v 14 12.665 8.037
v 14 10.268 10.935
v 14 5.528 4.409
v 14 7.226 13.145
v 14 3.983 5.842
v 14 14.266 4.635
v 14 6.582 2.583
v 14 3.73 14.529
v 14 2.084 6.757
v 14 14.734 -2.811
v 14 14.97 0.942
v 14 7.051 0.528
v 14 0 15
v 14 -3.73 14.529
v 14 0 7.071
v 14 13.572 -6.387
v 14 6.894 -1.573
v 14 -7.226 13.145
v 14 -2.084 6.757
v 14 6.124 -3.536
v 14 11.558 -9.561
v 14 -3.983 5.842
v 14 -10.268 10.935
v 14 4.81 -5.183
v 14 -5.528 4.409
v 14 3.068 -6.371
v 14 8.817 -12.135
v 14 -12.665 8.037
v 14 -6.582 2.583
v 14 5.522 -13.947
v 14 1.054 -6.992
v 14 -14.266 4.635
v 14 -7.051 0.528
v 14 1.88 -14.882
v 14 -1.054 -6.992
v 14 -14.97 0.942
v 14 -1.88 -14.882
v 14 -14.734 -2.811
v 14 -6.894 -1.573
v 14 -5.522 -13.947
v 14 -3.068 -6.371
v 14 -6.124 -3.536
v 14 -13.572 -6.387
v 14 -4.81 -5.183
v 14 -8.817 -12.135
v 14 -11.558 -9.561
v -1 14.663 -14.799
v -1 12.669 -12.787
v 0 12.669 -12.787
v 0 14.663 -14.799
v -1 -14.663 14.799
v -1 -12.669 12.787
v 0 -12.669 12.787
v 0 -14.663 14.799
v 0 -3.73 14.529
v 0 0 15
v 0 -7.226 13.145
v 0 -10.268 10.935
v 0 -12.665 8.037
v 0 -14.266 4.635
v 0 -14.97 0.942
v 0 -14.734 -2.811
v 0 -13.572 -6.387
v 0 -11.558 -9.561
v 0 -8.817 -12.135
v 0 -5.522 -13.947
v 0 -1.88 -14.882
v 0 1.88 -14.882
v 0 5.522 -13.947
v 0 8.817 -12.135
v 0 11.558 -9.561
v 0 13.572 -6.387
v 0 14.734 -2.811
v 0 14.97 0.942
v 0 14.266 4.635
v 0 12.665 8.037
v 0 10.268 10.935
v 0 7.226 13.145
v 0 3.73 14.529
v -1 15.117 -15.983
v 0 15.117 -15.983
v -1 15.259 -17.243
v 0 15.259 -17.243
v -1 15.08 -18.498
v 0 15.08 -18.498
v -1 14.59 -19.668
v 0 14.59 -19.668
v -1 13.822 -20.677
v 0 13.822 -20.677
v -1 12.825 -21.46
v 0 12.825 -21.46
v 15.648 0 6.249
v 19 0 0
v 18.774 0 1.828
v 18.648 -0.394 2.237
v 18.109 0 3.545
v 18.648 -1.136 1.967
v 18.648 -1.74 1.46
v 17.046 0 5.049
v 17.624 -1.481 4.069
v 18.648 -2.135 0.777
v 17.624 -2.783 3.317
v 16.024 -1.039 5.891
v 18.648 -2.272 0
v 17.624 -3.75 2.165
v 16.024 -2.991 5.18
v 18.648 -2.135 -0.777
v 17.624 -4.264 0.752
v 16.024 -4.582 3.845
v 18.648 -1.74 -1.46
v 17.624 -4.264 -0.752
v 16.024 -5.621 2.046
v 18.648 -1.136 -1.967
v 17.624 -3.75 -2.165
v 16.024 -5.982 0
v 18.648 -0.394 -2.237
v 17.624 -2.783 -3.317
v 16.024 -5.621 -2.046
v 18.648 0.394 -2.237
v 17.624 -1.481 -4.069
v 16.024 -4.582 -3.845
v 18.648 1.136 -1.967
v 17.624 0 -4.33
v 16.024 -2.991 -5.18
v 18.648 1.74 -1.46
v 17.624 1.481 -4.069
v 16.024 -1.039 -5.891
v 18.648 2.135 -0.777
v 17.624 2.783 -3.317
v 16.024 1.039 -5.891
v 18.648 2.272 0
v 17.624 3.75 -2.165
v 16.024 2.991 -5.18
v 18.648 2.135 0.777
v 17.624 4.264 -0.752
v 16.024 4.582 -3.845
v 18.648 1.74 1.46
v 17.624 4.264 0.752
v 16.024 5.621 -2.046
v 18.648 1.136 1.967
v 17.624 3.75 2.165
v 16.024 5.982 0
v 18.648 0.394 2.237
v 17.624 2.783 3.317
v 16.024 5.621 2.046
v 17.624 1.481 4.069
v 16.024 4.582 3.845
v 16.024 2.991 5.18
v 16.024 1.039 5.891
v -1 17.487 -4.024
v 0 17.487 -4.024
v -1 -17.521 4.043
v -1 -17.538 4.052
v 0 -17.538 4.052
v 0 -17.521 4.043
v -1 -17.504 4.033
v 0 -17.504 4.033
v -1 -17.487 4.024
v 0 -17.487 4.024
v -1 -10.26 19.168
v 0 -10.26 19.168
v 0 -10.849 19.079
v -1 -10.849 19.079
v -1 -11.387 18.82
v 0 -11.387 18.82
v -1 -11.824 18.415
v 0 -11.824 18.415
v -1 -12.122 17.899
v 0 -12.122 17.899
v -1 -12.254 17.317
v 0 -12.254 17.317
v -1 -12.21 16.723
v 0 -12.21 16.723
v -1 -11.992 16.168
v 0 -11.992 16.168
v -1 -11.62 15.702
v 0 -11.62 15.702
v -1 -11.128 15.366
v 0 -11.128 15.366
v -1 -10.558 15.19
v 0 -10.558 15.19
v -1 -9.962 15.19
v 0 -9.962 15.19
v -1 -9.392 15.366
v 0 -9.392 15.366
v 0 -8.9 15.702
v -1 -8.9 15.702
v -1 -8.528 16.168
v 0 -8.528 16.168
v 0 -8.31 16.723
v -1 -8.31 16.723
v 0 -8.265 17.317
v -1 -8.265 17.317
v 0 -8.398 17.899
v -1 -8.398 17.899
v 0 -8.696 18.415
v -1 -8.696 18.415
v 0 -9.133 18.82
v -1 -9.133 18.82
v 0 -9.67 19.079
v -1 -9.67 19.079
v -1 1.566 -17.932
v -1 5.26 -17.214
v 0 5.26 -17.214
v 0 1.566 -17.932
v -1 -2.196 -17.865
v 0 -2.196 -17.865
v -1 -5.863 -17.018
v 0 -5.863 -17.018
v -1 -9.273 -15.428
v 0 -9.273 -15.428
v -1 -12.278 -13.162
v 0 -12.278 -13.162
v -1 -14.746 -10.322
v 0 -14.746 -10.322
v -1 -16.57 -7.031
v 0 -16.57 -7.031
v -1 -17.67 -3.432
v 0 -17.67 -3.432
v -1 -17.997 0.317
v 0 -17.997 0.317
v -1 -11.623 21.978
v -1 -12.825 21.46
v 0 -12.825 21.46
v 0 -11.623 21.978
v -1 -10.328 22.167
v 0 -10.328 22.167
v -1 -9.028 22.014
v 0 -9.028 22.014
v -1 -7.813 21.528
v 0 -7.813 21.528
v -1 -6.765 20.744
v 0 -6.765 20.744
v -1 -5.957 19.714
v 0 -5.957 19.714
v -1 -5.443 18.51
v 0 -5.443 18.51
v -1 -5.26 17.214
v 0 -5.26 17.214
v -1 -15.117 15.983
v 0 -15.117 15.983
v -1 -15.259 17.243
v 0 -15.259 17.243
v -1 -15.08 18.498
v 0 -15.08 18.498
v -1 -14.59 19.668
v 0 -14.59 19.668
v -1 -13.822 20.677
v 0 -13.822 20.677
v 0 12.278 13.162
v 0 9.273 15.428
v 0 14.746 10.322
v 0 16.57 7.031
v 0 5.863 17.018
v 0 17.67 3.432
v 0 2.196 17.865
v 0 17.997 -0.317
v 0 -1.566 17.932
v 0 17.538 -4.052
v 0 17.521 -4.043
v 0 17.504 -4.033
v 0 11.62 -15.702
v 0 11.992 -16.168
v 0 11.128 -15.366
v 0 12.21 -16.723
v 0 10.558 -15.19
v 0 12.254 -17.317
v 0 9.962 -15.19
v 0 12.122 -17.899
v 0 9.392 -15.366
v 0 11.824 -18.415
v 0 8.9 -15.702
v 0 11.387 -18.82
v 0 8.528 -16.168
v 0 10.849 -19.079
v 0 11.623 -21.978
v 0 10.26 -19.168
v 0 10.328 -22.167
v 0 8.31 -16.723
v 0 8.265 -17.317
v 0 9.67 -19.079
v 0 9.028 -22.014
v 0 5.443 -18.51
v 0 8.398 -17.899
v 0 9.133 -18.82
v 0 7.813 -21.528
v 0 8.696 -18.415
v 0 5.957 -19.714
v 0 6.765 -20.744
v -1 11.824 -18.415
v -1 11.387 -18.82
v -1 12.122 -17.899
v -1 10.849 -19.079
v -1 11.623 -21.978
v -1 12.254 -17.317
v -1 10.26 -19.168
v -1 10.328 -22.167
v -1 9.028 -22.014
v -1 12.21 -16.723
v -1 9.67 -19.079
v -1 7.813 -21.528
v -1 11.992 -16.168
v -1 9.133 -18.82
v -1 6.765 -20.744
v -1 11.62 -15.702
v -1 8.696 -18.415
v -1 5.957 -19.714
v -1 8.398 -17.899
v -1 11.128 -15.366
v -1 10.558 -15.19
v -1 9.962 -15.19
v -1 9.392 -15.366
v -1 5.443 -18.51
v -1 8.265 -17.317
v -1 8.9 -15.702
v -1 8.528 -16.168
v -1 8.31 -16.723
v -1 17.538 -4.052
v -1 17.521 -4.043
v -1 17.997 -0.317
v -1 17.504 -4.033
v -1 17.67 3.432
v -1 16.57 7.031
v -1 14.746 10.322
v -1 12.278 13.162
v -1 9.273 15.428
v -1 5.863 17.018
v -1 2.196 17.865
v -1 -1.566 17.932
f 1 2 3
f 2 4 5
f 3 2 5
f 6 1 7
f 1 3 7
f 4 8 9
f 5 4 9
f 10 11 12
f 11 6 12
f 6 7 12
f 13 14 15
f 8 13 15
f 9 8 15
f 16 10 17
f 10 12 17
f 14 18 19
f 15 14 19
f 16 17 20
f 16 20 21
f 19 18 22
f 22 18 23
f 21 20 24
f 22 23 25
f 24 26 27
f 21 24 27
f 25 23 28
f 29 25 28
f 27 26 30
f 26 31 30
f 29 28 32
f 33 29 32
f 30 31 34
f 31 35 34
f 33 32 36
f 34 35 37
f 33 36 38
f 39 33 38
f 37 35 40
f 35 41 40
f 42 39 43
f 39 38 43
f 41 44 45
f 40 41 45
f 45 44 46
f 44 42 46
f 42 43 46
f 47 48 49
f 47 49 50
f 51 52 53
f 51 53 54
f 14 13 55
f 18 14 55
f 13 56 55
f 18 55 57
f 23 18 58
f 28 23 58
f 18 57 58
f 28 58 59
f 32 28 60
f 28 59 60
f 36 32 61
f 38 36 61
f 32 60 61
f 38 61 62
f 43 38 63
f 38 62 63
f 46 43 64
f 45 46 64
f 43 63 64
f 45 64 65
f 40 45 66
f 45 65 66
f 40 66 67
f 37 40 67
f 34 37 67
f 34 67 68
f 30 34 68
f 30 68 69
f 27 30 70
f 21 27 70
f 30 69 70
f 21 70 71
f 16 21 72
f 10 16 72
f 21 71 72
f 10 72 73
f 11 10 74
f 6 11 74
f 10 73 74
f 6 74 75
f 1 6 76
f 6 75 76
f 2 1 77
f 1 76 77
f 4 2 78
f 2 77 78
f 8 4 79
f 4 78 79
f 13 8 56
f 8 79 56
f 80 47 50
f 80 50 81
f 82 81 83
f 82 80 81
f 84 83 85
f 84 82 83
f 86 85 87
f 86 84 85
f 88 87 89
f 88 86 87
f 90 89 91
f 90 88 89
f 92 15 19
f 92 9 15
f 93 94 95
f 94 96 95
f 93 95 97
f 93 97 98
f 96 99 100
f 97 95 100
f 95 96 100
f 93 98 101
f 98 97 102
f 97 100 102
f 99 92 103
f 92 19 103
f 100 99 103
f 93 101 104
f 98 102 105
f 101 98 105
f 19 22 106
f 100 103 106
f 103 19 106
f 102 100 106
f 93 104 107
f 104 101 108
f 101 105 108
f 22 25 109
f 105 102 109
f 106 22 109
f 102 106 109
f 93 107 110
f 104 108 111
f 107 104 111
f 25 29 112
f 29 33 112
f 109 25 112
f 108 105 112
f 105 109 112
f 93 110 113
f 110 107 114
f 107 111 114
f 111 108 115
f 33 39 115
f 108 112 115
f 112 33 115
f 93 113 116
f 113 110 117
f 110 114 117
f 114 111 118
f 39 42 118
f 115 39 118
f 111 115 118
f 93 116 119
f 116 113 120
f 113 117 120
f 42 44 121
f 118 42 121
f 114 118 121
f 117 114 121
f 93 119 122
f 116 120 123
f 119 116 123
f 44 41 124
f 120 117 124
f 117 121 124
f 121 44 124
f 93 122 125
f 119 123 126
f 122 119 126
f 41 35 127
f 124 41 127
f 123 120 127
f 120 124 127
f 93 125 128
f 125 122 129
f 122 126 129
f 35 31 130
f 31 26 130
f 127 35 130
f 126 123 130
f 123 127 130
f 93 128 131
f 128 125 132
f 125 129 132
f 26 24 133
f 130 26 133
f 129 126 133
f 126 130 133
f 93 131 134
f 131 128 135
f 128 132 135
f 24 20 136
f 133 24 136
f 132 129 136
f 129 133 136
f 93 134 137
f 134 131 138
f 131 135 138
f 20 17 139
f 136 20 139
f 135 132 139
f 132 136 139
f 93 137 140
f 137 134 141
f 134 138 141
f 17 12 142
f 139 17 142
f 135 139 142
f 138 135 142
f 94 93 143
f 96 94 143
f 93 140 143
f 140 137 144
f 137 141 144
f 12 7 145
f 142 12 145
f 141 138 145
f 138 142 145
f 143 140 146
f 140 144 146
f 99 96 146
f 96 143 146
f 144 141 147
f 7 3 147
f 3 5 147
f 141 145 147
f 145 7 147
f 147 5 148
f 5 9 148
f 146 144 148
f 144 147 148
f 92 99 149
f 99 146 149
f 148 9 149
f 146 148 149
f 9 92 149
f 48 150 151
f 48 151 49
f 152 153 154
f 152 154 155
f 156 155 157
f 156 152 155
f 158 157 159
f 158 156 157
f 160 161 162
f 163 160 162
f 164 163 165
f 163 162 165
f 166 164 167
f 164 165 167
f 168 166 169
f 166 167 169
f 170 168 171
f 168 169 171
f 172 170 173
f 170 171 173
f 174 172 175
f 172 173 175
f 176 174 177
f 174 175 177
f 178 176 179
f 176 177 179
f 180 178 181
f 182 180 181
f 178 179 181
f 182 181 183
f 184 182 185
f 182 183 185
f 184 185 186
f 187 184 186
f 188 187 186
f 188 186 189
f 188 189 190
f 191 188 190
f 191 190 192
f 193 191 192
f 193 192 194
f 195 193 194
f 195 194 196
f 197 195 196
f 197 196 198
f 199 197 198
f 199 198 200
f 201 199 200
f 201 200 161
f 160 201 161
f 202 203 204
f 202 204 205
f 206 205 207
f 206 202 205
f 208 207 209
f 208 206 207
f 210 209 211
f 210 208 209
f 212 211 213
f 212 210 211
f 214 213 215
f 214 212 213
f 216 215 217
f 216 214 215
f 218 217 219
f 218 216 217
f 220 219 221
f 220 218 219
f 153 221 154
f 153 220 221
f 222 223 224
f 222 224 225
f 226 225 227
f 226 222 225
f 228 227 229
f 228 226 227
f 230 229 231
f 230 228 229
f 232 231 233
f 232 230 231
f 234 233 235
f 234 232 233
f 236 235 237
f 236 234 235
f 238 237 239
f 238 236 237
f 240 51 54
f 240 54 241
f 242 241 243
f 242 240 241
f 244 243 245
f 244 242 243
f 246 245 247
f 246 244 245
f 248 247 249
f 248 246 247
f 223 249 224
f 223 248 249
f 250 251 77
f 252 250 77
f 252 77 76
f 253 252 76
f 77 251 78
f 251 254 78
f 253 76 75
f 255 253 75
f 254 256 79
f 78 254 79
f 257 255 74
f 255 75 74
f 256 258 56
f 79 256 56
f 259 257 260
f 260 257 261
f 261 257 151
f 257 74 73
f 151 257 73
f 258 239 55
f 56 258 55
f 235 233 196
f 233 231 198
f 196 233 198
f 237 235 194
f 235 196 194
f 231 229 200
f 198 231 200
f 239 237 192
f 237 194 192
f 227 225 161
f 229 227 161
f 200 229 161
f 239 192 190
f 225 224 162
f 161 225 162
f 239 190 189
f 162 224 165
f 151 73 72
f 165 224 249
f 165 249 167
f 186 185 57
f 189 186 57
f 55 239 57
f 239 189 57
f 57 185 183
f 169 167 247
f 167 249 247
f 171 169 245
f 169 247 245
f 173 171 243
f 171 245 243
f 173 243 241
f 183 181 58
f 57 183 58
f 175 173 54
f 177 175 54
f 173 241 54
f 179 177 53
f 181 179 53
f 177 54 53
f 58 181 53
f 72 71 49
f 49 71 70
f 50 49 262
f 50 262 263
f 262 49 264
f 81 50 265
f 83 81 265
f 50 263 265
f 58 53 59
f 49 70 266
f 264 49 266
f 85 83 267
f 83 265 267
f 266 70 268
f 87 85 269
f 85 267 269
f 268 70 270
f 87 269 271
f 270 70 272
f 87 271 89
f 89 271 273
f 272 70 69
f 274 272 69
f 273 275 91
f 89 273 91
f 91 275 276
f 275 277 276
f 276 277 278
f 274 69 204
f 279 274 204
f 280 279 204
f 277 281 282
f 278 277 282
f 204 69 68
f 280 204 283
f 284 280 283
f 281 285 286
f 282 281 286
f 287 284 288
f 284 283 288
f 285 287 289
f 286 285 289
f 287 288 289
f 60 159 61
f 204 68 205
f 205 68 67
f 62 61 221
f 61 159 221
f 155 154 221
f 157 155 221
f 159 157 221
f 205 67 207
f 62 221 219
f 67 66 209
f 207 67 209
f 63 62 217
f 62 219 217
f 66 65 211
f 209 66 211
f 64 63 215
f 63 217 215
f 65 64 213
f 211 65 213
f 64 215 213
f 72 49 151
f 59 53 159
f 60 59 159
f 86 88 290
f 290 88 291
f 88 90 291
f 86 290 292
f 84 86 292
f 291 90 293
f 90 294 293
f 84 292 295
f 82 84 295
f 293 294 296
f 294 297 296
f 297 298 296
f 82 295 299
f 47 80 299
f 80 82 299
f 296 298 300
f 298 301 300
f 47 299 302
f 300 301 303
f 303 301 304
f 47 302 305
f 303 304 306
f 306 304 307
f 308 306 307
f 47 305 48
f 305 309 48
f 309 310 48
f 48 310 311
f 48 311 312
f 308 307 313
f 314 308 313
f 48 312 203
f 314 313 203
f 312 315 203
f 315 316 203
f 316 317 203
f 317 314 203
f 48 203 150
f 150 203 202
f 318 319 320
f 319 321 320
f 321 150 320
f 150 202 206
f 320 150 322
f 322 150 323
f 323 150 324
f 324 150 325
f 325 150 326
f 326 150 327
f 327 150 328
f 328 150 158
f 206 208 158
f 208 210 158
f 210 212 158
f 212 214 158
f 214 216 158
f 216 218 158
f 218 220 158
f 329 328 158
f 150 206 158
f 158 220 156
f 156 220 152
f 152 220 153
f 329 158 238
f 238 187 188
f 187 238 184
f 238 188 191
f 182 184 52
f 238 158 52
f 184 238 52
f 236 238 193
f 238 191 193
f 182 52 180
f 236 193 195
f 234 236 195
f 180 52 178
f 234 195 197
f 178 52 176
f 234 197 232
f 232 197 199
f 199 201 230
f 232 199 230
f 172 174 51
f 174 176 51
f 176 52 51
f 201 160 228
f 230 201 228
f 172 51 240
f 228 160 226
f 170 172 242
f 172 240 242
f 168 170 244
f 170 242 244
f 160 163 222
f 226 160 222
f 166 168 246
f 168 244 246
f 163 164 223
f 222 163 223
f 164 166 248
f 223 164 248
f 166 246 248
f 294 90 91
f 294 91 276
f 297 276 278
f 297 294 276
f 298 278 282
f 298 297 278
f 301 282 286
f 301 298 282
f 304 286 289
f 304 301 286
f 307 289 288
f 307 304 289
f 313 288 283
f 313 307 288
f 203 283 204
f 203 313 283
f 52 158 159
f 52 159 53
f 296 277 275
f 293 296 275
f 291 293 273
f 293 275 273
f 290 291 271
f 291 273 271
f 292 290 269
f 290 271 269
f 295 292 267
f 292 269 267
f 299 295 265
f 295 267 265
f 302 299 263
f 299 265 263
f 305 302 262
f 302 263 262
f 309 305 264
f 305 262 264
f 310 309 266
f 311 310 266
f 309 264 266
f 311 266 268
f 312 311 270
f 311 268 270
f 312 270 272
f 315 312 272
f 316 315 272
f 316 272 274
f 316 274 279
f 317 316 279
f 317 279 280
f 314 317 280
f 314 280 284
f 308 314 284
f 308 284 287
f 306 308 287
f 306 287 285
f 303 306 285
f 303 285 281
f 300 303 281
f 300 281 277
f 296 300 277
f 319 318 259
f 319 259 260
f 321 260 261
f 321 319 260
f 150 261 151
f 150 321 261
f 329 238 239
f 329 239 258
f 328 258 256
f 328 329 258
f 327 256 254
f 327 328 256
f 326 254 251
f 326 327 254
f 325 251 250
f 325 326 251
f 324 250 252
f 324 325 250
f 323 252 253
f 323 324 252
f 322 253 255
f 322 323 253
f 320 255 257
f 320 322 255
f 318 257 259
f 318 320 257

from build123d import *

# Parameters (mm, degrees)
ESQUISSE4_R                     = 2
ENL_V_MAT_EXTRU_1_DEPTH         = 10
R_P_TITION_CIRCULAIRE1_COUNT    = 2
ENL_V_START                     = -1
ENL_V_DE_MAT_EXTRU_MINCE1_DEPTH = 1


# Read off the part's stored shape, not the designer's step: Enlèv. de mat.-Extru.-Mince1
with BuildPart() as part:
    # Esquisse3 → Révolution5 (revolve)
    with BuildSketch(Plane.XY, mode=Mode.PRIVATE) as r_volution5_sk:
        with BuildLine():
            Line((14, -7.071067812), (14, -15))
            Line((14, -15), (0, -15))
            Line((0, -15), (0, -25))
            Line((0, -25), (-1, -25))
            Line((-1, -25), (-1, 0))
            Line((-1, 0), (19, 0))
            ThreePointArc((19, 0), (17.623724357, -4.330127019), (14, -7.071067812))
        make_face()
    revolve(r_volution5_sk.sketch.rotate(Axis((-63.101738984, 0, 0), (1, 0, 0)), 270), axis=Axis((-63.101738984, 0, 0), (1, 0, 0)))

    # Esquisse4 → Enlèv. mat.-Extru.1 (cut)
    with BuildSketch(Plane(origin=(0, 0, 0), x_dir=(0, 0, -1), z_dir=(1, 0, 0))):
        with Locations((17.167855519, 10.259860471)):
            Circle(ESQUISSE4_R)
    enl_v_mat_extru_1 = extrude(amount=-ENL_V_MAT_EXTRU_1_DEPTH, mode=Mode.SUBTRACT)

    # Répétition circulaire1: Enlèv. mat.-Extru.1 ×2 about axis
    r_p_tition_circulaire1_axis = Axis((0, 0, 0), (1, 0, 0))
    for i in range(1, R_P_TITION_CIRCULAIRE1_COUNT):
        add(enl_v_mat_extru_1.rotate(r_p_tition_circulaire1_axis, i * 360 / R_P_TITION_CIRCULAIRE1_COUNT), mode=Mode.SUBTRACT)

    # Enlèv. de mat.-Extru.-Mince1 outline → Enlèv. de mat.-Extru.-Mince1 (cut)
    with BuildSketch(Plane(origin=(0, 0, 0), x_dir=(0, 0, -1), z_dir=(1, 0, 0)).offset(ENL_V_START)):
        with BuildLine():
            ThreePointArc((-21.459819345, -12.824825678), (-21.528104694, -7.812775037), (-17.214284766, -5.260076044))
            ThreePointArc((-17.214284766, -5.260076044), (-13.162462305, 12.278012301), (4.051895913, 17.538019829))
            ThreePointArc((4.051895913, 17.538019829), (4.037882143, 17.51270813), (4.02391722, 17.487369448))
            Line((4.02391722, 17.487369448), (12.786542752, 12.66903013))
            Line((12.786542752, 12.66903013), (14.799239297, 14.663229317))
            ThreePointArc((14.799239297, 14.663229317), (18.49817446, 15.079637594), (21.459819345, 12.824825678))
            ThreePointArc((21.459819345, 12.824825678), (-12.824825678, 21.459819345), (-21.459819345, -12.824825678))
        make_face()
        with BuildLine():
            ThreePointArc((-14.799239297, -14.663229317), (-18.49817446, -15.079637594), (-21.459819345, -12.824825678))
            ThreePointArc((-21.459819345, -12.824825678), (12.824825678, -21.459819345), (21.459819345, 12.824825678))
            ThreePointArc((21.459819345, 12.824825678), (21.528104694, 7.812775037), (17.214284766, 5.260076044))
            ThreePointArc((17.214284766, 5.260076044), (13.162462305, -12.278012301), (-4.051895913, -17.538019829))
            ThreePointArc((-4.051895913, -17.538019829), (-4.037882143, -17.51270813), (-4.02391722, -17.487369448))
            Line((-4.02391722, -17.487369448), (-12.786542752, -12.66903013))
            Line((-12.786542752, -12.66903013), (-14.799239297, -14.663229317))
        make_face()
    extrude(amount=ENL_V_DE_MAT_EXTRU_MINCE1_DEPTH, mode=Mode.SUBTRACT)


solid = part.part
